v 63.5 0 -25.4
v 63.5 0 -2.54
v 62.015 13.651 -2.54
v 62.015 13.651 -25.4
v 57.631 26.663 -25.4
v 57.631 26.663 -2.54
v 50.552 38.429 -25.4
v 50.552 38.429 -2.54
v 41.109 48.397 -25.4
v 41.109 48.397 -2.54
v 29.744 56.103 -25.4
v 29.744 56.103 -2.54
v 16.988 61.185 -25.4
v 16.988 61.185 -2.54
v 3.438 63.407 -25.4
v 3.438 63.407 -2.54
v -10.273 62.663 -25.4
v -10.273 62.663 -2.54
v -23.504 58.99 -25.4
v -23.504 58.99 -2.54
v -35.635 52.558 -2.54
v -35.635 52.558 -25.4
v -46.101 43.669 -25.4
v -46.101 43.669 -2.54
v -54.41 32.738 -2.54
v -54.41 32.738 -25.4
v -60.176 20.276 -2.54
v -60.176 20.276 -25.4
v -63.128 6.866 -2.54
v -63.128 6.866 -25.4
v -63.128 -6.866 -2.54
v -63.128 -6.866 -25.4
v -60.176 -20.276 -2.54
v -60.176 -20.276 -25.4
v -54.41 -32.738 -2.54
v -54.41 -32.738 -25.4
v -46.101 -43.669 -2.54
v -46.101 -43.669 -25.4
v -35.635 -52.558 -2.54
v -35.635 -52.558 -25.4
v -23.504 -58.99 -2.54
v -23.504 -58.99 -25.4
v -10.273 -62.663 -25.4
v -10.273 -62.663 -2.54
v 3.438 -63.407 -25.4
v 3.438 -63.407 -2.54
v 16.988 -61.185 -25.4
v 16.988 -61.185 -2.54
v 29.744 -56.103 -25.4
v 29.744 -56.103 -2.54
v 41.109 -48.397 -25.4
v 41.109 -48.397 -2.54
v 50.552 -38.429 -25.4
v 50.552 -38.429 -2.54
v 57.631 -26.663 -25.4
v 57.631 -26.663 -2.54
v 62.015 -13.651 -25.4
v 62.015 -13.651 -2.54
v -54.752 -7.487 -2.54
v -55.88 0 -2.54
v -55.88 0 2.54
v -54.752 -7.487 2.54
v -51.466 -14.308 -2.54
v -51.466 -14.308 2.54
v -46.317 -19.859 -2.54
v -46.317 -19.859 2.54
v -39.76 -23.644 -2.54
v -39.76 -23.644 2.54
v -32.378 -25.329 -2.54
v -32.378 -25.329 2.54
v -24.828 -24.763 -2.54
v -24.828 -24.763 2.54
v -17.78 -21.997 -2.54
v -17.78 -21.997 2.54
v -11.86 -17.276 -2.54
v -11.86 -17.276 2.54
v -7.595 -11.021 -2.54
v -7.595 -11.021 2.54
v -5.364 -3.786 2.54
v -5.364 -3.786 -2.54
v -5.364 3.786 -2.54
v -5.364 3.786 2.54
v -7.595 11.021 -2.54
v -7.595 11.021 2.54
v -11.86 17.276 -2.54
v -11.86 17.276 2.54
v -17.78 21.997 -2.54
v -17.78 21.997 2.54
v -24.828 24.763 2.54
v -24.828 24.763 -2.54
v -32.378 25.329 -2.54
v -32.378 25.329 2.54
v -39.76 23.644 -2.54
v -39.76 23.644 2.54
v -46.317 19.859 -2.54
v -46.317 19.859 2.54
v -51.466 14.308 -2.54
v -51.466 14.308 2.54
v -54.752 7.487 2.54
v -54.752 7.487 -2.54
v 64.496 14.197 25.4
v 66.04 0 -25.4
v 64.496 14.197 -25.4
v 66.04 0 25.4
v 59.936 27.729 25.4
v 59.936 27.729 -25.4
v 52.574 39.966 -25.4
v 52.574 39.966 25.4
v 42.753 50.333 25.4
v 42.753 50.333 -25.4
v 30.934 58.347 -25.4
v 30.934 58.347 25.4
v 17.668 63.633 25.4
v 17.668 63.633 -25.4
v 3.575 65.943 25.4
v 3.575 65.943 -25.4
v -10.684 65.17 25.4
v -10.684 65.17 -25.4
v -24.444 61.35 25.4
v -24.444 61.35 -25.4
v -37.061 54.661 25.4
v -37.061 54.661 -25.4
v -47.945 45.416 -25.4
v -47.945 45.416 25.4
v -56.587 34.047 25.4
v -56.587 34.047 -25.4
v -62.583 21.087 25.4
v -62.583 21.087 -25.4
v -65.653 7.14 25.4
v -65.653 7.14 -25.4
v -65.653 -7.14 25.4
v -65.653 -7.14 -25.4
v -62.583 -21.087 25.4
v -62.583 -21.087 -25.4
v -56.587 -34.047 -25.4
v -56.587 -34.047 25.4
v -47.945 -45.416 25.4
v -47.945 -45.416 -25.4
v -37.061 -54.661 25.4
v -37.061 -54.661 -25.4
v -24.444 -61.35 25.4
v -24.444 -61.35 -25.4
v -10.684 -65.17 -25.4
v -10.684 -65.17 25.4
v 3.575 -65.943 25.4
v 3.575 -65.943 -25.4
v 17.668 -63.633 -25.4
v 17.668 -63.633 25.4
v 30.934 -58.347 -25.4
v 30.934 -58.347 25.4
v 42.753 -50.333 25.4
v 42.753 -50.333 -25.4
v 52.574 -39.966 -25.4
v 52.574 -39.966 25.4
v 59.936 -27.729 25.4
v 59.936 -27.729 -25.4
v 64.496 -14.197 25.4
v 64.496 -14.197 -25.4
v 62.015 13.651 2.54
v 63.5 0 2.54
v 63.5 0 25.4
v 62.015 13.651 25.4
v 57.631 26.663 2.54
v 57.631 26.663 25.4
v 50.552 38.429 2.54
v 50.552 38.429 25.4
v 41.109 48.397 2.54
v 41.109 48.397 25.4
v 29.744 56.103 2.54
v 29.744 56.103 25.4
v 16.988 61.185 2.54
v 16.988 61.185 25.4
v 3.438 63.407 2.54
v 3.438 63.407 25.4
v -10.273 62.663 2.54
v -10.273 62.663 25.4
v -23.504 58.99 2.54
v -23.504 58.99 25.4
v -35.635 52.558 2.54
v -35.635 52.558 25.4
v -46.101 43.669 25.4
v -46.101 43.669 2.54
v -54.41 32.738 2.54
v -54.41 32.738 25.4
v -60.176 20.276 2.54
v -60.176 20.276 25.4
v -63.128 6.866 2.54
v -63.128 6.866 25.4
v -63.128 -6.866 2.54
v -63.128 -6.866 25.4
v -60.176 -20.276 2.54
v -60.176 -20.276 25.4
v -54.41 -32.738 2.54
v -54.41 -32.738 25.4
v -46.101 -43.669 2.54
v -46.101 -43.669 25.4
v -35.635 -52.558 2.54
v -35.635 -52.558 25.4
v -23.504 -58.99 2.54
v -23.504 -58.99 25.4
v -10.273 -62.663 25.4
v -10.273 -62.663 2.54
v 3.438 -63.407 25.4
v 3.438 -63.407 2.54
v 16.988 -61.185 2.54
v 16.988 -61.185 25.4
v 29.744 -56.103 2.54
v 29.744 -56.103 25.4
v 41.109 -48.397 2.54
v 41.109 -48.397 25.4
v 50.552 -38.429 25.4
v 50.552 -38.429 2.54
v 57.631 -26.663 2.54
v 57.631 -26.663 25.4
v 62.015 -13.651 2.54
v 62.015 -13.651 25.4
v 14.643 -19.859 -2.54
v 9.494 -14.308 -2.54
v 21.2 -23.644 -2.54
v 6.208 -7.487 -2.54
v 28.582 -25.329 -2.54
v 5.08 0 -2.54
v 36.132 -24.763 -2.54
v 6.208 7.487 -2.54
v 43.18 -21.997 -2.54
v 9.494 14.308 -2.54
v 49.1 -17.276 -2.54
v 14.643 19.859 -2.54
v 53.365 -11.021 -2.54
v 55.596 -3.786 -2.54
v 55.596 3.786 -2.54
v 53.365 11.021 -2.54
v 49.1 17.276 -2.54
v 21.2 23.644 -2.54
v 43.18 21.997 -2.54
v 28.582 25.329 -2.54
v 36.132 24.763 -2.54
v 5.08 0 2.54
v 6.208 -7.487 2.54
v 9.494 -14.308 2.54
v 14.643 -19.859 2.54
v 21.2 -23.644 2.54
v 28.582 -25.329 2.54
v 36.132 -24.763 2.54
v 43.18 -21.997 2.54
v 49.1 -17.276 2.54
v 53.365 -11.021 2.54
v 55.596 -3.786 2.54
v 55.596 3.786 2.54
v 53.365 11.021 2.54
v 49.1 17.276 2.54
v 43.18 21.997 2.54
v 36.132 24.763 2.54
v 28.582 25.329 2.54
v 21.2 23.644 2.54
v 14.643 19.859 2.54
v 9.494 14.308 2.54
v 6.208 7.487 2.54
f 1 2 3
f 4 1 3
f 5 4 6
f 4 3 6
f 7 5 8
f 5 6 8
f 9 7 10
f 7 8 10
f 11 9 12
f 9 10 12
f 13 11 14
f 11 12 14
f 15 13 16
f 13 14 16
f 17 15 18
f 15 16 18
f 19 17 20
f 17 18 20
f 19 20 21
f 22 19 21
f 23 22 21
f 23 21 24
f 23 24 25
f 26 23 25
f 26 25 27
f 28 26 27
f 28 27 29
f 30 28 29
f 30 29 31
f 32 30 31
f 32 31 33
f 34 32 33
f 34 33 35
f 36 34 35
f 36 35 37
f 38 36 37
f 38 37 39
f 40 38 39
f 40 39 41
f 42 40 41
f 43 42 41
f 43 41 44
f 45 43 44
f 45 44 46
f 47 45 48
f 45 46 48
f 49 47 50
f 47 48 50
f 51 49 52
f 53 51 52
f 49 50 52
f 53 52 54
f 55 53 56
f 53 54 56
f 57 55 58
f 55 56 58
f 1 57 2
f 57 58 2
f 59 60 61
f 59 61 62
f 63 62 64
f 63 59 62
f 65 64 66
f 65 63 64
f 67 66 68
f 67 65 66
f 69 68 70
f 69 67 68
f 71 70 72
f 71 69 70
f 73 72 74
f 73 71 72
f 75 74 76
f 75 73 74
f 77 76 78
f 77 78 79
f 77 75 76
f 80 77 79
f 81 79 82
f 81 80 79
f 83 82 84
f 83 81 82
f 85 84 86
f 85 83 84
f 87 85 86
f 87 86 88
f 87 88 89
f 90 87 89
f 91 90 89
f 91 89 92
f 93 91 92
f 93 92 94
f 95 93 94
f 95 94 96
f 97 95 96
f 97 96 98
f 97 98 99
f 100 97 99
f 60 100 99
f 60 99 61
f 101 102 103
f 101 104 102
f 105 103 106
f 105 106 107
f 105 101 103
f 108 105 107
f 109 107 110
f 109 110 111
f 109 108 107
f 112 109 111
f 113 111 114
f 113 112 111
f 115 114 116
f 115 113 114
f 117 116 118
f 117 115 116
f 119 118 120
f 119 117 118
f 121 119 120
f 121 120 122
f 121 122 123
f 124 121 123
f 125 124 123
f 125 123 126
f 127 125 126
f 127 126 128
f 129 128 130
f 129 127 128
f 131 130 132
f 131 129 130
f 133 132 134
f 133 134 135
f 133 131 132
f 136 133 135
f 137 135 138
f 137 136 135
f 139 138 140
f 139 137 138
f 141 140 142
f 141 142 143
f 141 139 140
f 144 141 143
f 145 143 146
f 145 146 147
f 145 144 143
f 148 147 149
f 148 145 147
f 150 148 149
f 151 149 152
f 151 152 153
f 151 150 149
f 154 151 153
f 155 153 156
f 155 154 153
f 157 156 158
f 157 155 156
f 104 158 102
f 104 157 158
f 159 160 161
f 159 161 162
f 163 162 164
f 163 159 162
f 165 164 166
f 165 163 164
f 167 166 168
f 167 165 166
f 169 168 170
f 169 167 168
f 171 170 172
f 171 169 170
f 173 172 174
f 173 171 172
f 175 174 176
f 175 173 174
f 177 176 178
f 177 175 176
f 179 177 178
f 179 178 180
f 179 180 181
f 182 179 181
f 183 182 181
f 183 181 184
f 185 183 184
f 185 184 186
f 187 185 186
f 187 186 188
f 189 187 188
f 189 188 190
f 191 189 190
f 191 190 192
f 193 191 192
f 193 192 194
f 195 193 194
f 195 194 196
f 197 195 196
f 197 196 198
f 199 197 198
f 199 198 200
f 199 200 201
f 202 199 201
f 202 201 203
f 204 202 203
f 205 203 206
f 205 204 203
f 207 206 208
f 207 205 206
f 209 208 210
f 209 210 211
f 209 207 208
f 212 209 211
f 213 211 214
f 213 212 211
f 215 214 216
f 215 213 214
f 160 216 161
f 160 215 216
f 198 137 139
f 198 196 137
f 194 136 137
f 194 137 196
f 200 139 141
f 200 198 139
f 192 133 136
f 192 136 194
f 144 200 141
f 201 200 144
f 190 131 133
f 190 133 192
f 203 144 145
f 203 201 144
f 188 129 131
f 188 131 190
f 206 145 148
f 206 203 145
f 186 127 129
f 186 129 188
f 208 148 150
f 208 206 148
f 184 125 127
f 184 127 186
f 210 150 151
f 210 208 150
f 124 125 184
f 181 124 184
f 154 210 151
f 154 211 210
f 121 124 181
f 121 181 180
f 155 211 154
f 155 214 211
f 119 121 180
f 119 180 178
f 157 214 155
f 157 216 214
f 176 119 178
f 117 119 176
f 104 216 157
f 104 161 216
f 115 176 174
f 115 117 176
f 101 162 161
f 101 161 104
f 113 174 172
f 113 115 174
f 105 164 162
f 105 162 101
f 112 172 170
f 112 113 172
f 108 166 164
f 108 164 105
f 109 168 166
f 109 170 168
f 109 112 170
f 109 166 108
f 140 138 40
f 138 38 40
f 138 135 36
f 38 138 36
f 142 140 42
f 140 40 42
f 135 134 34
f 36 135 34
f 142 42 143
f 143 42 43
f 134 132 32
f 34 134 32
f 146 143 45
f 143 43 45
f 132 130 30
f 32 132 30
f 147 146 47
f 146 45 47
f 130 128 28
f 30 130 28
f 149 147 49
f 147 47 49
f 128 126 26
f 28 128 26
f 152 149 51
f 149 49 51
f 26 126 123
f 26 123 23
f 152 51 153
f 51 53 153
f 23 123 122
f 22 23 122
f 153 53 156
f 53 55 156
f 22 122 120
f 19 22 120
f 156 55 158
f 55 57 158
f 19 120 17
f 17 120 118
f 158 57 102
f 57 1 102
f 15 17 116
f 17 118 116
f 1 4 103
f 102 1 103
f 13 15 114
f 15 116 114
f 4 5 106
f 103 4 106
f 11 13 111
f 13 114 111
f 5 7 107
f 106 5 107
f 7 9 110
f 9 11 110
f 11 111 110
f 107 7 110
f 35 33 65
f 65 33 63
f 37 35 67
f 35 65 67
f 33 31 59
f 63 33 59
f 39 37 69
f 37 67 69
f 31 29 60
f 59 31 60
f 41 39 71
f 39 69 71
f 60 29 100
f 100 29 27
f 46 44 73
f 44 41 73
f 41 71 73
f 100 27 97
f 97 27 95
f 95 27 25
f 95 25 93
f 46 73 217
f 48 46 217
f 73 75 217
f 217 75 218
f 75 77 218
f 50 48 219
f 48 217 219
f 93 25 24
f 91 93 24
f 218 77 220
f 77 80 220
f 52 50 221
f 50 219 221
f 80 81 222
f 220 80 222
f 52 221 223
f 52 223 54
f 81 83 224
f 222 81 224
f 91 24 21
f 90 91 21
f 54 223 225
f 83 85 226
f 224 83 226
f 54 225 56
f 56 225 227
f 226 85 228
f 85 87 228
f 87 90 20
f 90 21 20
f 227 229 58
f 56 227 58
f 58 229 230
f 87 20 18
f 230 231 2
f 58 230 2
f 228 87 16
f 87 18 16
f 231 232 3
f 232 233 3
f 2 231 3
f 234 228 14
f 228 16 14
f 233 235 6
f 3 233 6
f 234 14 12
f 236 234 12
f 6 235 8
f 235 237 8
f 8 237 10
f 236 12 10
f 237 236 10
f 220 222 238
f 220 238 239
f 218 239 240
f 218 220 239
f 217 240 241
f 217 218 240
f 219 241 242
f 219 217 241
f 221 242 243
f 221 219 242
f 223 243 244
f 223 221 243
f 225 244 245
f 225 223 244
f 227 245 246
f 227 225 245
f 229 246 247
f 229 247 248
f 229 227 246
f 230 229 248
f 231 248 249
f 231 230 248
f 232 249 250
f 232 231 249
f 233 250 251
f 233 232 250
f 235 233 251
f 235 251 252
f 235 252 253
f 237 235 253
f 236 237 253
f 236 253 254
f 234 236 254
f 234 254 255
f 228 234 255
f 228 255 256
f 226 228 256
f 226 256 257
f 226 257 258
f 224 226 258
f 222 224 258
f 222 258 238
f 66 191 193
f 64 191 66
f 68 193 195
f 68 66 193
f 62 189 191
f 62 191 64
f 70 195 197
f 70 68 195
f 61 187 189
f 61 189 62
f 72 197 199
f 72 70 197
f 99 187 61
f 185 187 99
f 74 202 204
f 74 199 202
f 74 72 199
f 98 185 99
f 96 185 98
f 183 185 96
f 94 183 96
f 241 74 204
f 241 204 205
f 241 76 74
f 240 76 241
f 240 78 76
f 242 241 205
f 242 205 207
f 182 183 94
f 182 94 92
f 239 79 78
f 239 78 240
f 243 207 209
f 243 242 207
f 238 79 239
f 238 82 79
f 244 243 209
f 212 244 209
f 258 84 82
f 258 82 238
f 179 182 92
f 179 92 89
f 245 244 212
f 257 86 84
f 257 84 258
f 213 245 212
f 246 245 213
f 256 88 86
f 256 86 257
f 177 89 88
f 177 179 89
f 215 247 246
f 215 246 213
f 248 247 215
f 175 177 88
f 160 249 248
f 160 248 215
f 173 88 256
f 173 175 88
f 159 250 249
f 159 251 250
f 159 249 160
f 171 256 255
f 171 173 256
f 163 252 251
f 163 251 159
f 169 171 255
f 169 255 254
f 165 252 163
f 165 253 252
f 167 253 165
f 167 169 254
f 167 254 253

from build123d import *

# Parameters (mm, degrees)
F0_R     = 66.04
F1_DEPTH = 25.4
F3_T     = -2.54
F5_D     = 50.8
F5_DEPTH = 127


with BuildPart() as f1:
    # F0 (on Top) → F1 (new body)
    with BuildSketch(Plane.XY):
        Circle(F0_R)
    extrude(amount=F1_DEPTH)

    # F3
    f3_openings = [f1.faces().sort_by_distance(p)[0] for p in [
        (0, 0, 25.4),
    ]]
    offset(amount=F3_T, openings=f3_openings)

    # F5
    with Locations(Plane(origin=(0, 0, 0), x_dir=(1, 0, 0), z_dir=(0, 0, -1))):
        with Locations((30.48, 0), (-30.48, 0)):
            Hole(F5_D / 2, depth=F5_DEPTH)

    # F6: F1 across face


with BuildPart() as f1_1:
    add(f1.part)
    add(f1.part.mirror(Plane(origin=(0, 0, 0), x_dir=(1, 0, 0), z_dir=(0, 0, -1))))


solid = f1_1.part
